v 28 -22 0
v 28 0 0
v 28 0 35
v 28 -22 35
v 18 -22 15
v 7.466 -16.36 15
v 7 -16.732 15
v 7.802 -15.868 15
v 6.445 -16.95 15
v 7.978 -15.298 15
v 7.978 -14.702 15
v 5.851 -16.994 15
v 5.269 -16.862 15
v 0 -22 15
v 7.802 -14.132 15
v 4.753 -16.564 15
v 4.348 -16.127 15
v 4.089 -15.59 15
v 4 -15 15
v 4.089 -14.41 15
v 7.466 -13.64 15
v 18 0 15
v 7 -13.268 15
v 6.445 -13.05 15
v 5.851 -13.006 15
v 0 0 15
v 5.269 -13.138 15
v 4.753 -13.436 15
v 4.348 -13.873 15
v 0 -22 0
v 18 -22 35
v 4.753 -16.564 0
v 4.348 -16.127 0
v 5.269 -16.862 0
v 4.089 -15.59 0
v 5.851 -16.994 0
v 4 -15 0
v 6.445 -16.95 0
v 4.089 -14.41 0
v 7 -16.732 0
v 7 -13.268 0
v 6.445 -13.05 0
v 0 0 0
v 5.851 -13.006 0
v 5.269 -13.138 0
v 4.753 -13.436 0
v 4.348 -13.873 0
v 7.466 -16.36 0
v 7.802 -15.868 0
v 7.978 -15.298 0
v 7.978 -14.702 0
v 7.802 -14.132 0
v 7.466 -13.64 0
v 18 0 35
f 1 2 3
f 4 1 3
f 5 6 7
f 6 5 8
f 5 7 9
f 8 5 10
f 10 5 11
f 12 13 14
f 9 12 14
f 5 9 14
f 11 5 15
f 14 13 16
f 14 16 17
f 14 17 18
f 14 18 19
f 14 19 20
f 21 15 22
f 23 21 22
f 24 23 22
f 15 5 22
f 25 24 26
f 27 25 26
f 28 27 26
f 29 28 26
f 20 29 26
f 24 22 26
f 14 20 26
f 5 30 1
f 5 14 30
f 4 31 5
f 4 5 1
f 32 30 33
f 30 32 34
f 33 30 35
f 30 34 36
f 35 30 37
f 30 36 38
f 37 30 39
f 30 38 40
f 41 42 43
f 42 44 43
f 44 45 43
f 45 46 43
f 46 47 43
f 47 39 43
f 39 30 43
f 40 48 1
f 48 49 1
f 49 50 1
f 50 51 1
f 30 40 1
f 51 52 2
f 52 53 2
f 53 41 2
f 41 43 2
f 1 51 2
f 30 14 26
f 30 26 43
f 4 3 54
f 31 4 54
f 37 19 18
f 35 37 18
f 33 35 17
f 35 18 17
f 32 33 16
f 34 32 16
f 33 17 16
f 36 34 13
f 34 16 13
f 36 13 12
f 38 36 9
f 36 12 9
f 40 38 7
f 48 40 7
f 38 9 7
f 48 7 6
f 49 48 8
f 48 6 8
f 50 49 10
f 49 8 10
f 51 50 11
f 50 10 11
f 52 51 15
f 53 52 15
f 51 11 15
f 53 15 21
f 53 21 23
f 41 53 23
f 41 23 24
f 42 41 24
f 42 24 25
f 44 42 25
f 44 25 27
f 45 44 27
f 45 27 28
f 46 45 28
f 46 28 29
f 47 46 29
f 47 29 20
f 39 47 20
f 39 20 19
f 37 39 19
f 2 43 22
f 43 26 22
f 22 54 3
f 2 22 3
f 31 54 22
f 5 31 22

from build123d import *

# Parameters (mm, degrees)
PAD_DEPTH    = 22
SKETCH001_R  = 2
POCKET_DEPTH = 15.001


with BuildPart() as part:
    # Sketch → Pad (new body)
    with BuildSketch(Plane.XZ):
        Polygon((0, 0), (28, 0), (28, 35), (18, 35), (18, 15), (0, 15), align=None)
    extrude(amount=PAD_DEPTH)

    # Sketch001 (on Face5 of Pad) → Pocket (cut, through all)
    with BuildSketch(Plane(origin=(0, 0, 15), x_dir=(-1, 0, 0), z_dir=(0, 0, 1))):
        with Locations((-6, 15)):
            Circle(SKETCH001_R)
    extrude(amount=-POCKET_DEPTH, mode=Mode.SUBTRACT)


solid = part.part
